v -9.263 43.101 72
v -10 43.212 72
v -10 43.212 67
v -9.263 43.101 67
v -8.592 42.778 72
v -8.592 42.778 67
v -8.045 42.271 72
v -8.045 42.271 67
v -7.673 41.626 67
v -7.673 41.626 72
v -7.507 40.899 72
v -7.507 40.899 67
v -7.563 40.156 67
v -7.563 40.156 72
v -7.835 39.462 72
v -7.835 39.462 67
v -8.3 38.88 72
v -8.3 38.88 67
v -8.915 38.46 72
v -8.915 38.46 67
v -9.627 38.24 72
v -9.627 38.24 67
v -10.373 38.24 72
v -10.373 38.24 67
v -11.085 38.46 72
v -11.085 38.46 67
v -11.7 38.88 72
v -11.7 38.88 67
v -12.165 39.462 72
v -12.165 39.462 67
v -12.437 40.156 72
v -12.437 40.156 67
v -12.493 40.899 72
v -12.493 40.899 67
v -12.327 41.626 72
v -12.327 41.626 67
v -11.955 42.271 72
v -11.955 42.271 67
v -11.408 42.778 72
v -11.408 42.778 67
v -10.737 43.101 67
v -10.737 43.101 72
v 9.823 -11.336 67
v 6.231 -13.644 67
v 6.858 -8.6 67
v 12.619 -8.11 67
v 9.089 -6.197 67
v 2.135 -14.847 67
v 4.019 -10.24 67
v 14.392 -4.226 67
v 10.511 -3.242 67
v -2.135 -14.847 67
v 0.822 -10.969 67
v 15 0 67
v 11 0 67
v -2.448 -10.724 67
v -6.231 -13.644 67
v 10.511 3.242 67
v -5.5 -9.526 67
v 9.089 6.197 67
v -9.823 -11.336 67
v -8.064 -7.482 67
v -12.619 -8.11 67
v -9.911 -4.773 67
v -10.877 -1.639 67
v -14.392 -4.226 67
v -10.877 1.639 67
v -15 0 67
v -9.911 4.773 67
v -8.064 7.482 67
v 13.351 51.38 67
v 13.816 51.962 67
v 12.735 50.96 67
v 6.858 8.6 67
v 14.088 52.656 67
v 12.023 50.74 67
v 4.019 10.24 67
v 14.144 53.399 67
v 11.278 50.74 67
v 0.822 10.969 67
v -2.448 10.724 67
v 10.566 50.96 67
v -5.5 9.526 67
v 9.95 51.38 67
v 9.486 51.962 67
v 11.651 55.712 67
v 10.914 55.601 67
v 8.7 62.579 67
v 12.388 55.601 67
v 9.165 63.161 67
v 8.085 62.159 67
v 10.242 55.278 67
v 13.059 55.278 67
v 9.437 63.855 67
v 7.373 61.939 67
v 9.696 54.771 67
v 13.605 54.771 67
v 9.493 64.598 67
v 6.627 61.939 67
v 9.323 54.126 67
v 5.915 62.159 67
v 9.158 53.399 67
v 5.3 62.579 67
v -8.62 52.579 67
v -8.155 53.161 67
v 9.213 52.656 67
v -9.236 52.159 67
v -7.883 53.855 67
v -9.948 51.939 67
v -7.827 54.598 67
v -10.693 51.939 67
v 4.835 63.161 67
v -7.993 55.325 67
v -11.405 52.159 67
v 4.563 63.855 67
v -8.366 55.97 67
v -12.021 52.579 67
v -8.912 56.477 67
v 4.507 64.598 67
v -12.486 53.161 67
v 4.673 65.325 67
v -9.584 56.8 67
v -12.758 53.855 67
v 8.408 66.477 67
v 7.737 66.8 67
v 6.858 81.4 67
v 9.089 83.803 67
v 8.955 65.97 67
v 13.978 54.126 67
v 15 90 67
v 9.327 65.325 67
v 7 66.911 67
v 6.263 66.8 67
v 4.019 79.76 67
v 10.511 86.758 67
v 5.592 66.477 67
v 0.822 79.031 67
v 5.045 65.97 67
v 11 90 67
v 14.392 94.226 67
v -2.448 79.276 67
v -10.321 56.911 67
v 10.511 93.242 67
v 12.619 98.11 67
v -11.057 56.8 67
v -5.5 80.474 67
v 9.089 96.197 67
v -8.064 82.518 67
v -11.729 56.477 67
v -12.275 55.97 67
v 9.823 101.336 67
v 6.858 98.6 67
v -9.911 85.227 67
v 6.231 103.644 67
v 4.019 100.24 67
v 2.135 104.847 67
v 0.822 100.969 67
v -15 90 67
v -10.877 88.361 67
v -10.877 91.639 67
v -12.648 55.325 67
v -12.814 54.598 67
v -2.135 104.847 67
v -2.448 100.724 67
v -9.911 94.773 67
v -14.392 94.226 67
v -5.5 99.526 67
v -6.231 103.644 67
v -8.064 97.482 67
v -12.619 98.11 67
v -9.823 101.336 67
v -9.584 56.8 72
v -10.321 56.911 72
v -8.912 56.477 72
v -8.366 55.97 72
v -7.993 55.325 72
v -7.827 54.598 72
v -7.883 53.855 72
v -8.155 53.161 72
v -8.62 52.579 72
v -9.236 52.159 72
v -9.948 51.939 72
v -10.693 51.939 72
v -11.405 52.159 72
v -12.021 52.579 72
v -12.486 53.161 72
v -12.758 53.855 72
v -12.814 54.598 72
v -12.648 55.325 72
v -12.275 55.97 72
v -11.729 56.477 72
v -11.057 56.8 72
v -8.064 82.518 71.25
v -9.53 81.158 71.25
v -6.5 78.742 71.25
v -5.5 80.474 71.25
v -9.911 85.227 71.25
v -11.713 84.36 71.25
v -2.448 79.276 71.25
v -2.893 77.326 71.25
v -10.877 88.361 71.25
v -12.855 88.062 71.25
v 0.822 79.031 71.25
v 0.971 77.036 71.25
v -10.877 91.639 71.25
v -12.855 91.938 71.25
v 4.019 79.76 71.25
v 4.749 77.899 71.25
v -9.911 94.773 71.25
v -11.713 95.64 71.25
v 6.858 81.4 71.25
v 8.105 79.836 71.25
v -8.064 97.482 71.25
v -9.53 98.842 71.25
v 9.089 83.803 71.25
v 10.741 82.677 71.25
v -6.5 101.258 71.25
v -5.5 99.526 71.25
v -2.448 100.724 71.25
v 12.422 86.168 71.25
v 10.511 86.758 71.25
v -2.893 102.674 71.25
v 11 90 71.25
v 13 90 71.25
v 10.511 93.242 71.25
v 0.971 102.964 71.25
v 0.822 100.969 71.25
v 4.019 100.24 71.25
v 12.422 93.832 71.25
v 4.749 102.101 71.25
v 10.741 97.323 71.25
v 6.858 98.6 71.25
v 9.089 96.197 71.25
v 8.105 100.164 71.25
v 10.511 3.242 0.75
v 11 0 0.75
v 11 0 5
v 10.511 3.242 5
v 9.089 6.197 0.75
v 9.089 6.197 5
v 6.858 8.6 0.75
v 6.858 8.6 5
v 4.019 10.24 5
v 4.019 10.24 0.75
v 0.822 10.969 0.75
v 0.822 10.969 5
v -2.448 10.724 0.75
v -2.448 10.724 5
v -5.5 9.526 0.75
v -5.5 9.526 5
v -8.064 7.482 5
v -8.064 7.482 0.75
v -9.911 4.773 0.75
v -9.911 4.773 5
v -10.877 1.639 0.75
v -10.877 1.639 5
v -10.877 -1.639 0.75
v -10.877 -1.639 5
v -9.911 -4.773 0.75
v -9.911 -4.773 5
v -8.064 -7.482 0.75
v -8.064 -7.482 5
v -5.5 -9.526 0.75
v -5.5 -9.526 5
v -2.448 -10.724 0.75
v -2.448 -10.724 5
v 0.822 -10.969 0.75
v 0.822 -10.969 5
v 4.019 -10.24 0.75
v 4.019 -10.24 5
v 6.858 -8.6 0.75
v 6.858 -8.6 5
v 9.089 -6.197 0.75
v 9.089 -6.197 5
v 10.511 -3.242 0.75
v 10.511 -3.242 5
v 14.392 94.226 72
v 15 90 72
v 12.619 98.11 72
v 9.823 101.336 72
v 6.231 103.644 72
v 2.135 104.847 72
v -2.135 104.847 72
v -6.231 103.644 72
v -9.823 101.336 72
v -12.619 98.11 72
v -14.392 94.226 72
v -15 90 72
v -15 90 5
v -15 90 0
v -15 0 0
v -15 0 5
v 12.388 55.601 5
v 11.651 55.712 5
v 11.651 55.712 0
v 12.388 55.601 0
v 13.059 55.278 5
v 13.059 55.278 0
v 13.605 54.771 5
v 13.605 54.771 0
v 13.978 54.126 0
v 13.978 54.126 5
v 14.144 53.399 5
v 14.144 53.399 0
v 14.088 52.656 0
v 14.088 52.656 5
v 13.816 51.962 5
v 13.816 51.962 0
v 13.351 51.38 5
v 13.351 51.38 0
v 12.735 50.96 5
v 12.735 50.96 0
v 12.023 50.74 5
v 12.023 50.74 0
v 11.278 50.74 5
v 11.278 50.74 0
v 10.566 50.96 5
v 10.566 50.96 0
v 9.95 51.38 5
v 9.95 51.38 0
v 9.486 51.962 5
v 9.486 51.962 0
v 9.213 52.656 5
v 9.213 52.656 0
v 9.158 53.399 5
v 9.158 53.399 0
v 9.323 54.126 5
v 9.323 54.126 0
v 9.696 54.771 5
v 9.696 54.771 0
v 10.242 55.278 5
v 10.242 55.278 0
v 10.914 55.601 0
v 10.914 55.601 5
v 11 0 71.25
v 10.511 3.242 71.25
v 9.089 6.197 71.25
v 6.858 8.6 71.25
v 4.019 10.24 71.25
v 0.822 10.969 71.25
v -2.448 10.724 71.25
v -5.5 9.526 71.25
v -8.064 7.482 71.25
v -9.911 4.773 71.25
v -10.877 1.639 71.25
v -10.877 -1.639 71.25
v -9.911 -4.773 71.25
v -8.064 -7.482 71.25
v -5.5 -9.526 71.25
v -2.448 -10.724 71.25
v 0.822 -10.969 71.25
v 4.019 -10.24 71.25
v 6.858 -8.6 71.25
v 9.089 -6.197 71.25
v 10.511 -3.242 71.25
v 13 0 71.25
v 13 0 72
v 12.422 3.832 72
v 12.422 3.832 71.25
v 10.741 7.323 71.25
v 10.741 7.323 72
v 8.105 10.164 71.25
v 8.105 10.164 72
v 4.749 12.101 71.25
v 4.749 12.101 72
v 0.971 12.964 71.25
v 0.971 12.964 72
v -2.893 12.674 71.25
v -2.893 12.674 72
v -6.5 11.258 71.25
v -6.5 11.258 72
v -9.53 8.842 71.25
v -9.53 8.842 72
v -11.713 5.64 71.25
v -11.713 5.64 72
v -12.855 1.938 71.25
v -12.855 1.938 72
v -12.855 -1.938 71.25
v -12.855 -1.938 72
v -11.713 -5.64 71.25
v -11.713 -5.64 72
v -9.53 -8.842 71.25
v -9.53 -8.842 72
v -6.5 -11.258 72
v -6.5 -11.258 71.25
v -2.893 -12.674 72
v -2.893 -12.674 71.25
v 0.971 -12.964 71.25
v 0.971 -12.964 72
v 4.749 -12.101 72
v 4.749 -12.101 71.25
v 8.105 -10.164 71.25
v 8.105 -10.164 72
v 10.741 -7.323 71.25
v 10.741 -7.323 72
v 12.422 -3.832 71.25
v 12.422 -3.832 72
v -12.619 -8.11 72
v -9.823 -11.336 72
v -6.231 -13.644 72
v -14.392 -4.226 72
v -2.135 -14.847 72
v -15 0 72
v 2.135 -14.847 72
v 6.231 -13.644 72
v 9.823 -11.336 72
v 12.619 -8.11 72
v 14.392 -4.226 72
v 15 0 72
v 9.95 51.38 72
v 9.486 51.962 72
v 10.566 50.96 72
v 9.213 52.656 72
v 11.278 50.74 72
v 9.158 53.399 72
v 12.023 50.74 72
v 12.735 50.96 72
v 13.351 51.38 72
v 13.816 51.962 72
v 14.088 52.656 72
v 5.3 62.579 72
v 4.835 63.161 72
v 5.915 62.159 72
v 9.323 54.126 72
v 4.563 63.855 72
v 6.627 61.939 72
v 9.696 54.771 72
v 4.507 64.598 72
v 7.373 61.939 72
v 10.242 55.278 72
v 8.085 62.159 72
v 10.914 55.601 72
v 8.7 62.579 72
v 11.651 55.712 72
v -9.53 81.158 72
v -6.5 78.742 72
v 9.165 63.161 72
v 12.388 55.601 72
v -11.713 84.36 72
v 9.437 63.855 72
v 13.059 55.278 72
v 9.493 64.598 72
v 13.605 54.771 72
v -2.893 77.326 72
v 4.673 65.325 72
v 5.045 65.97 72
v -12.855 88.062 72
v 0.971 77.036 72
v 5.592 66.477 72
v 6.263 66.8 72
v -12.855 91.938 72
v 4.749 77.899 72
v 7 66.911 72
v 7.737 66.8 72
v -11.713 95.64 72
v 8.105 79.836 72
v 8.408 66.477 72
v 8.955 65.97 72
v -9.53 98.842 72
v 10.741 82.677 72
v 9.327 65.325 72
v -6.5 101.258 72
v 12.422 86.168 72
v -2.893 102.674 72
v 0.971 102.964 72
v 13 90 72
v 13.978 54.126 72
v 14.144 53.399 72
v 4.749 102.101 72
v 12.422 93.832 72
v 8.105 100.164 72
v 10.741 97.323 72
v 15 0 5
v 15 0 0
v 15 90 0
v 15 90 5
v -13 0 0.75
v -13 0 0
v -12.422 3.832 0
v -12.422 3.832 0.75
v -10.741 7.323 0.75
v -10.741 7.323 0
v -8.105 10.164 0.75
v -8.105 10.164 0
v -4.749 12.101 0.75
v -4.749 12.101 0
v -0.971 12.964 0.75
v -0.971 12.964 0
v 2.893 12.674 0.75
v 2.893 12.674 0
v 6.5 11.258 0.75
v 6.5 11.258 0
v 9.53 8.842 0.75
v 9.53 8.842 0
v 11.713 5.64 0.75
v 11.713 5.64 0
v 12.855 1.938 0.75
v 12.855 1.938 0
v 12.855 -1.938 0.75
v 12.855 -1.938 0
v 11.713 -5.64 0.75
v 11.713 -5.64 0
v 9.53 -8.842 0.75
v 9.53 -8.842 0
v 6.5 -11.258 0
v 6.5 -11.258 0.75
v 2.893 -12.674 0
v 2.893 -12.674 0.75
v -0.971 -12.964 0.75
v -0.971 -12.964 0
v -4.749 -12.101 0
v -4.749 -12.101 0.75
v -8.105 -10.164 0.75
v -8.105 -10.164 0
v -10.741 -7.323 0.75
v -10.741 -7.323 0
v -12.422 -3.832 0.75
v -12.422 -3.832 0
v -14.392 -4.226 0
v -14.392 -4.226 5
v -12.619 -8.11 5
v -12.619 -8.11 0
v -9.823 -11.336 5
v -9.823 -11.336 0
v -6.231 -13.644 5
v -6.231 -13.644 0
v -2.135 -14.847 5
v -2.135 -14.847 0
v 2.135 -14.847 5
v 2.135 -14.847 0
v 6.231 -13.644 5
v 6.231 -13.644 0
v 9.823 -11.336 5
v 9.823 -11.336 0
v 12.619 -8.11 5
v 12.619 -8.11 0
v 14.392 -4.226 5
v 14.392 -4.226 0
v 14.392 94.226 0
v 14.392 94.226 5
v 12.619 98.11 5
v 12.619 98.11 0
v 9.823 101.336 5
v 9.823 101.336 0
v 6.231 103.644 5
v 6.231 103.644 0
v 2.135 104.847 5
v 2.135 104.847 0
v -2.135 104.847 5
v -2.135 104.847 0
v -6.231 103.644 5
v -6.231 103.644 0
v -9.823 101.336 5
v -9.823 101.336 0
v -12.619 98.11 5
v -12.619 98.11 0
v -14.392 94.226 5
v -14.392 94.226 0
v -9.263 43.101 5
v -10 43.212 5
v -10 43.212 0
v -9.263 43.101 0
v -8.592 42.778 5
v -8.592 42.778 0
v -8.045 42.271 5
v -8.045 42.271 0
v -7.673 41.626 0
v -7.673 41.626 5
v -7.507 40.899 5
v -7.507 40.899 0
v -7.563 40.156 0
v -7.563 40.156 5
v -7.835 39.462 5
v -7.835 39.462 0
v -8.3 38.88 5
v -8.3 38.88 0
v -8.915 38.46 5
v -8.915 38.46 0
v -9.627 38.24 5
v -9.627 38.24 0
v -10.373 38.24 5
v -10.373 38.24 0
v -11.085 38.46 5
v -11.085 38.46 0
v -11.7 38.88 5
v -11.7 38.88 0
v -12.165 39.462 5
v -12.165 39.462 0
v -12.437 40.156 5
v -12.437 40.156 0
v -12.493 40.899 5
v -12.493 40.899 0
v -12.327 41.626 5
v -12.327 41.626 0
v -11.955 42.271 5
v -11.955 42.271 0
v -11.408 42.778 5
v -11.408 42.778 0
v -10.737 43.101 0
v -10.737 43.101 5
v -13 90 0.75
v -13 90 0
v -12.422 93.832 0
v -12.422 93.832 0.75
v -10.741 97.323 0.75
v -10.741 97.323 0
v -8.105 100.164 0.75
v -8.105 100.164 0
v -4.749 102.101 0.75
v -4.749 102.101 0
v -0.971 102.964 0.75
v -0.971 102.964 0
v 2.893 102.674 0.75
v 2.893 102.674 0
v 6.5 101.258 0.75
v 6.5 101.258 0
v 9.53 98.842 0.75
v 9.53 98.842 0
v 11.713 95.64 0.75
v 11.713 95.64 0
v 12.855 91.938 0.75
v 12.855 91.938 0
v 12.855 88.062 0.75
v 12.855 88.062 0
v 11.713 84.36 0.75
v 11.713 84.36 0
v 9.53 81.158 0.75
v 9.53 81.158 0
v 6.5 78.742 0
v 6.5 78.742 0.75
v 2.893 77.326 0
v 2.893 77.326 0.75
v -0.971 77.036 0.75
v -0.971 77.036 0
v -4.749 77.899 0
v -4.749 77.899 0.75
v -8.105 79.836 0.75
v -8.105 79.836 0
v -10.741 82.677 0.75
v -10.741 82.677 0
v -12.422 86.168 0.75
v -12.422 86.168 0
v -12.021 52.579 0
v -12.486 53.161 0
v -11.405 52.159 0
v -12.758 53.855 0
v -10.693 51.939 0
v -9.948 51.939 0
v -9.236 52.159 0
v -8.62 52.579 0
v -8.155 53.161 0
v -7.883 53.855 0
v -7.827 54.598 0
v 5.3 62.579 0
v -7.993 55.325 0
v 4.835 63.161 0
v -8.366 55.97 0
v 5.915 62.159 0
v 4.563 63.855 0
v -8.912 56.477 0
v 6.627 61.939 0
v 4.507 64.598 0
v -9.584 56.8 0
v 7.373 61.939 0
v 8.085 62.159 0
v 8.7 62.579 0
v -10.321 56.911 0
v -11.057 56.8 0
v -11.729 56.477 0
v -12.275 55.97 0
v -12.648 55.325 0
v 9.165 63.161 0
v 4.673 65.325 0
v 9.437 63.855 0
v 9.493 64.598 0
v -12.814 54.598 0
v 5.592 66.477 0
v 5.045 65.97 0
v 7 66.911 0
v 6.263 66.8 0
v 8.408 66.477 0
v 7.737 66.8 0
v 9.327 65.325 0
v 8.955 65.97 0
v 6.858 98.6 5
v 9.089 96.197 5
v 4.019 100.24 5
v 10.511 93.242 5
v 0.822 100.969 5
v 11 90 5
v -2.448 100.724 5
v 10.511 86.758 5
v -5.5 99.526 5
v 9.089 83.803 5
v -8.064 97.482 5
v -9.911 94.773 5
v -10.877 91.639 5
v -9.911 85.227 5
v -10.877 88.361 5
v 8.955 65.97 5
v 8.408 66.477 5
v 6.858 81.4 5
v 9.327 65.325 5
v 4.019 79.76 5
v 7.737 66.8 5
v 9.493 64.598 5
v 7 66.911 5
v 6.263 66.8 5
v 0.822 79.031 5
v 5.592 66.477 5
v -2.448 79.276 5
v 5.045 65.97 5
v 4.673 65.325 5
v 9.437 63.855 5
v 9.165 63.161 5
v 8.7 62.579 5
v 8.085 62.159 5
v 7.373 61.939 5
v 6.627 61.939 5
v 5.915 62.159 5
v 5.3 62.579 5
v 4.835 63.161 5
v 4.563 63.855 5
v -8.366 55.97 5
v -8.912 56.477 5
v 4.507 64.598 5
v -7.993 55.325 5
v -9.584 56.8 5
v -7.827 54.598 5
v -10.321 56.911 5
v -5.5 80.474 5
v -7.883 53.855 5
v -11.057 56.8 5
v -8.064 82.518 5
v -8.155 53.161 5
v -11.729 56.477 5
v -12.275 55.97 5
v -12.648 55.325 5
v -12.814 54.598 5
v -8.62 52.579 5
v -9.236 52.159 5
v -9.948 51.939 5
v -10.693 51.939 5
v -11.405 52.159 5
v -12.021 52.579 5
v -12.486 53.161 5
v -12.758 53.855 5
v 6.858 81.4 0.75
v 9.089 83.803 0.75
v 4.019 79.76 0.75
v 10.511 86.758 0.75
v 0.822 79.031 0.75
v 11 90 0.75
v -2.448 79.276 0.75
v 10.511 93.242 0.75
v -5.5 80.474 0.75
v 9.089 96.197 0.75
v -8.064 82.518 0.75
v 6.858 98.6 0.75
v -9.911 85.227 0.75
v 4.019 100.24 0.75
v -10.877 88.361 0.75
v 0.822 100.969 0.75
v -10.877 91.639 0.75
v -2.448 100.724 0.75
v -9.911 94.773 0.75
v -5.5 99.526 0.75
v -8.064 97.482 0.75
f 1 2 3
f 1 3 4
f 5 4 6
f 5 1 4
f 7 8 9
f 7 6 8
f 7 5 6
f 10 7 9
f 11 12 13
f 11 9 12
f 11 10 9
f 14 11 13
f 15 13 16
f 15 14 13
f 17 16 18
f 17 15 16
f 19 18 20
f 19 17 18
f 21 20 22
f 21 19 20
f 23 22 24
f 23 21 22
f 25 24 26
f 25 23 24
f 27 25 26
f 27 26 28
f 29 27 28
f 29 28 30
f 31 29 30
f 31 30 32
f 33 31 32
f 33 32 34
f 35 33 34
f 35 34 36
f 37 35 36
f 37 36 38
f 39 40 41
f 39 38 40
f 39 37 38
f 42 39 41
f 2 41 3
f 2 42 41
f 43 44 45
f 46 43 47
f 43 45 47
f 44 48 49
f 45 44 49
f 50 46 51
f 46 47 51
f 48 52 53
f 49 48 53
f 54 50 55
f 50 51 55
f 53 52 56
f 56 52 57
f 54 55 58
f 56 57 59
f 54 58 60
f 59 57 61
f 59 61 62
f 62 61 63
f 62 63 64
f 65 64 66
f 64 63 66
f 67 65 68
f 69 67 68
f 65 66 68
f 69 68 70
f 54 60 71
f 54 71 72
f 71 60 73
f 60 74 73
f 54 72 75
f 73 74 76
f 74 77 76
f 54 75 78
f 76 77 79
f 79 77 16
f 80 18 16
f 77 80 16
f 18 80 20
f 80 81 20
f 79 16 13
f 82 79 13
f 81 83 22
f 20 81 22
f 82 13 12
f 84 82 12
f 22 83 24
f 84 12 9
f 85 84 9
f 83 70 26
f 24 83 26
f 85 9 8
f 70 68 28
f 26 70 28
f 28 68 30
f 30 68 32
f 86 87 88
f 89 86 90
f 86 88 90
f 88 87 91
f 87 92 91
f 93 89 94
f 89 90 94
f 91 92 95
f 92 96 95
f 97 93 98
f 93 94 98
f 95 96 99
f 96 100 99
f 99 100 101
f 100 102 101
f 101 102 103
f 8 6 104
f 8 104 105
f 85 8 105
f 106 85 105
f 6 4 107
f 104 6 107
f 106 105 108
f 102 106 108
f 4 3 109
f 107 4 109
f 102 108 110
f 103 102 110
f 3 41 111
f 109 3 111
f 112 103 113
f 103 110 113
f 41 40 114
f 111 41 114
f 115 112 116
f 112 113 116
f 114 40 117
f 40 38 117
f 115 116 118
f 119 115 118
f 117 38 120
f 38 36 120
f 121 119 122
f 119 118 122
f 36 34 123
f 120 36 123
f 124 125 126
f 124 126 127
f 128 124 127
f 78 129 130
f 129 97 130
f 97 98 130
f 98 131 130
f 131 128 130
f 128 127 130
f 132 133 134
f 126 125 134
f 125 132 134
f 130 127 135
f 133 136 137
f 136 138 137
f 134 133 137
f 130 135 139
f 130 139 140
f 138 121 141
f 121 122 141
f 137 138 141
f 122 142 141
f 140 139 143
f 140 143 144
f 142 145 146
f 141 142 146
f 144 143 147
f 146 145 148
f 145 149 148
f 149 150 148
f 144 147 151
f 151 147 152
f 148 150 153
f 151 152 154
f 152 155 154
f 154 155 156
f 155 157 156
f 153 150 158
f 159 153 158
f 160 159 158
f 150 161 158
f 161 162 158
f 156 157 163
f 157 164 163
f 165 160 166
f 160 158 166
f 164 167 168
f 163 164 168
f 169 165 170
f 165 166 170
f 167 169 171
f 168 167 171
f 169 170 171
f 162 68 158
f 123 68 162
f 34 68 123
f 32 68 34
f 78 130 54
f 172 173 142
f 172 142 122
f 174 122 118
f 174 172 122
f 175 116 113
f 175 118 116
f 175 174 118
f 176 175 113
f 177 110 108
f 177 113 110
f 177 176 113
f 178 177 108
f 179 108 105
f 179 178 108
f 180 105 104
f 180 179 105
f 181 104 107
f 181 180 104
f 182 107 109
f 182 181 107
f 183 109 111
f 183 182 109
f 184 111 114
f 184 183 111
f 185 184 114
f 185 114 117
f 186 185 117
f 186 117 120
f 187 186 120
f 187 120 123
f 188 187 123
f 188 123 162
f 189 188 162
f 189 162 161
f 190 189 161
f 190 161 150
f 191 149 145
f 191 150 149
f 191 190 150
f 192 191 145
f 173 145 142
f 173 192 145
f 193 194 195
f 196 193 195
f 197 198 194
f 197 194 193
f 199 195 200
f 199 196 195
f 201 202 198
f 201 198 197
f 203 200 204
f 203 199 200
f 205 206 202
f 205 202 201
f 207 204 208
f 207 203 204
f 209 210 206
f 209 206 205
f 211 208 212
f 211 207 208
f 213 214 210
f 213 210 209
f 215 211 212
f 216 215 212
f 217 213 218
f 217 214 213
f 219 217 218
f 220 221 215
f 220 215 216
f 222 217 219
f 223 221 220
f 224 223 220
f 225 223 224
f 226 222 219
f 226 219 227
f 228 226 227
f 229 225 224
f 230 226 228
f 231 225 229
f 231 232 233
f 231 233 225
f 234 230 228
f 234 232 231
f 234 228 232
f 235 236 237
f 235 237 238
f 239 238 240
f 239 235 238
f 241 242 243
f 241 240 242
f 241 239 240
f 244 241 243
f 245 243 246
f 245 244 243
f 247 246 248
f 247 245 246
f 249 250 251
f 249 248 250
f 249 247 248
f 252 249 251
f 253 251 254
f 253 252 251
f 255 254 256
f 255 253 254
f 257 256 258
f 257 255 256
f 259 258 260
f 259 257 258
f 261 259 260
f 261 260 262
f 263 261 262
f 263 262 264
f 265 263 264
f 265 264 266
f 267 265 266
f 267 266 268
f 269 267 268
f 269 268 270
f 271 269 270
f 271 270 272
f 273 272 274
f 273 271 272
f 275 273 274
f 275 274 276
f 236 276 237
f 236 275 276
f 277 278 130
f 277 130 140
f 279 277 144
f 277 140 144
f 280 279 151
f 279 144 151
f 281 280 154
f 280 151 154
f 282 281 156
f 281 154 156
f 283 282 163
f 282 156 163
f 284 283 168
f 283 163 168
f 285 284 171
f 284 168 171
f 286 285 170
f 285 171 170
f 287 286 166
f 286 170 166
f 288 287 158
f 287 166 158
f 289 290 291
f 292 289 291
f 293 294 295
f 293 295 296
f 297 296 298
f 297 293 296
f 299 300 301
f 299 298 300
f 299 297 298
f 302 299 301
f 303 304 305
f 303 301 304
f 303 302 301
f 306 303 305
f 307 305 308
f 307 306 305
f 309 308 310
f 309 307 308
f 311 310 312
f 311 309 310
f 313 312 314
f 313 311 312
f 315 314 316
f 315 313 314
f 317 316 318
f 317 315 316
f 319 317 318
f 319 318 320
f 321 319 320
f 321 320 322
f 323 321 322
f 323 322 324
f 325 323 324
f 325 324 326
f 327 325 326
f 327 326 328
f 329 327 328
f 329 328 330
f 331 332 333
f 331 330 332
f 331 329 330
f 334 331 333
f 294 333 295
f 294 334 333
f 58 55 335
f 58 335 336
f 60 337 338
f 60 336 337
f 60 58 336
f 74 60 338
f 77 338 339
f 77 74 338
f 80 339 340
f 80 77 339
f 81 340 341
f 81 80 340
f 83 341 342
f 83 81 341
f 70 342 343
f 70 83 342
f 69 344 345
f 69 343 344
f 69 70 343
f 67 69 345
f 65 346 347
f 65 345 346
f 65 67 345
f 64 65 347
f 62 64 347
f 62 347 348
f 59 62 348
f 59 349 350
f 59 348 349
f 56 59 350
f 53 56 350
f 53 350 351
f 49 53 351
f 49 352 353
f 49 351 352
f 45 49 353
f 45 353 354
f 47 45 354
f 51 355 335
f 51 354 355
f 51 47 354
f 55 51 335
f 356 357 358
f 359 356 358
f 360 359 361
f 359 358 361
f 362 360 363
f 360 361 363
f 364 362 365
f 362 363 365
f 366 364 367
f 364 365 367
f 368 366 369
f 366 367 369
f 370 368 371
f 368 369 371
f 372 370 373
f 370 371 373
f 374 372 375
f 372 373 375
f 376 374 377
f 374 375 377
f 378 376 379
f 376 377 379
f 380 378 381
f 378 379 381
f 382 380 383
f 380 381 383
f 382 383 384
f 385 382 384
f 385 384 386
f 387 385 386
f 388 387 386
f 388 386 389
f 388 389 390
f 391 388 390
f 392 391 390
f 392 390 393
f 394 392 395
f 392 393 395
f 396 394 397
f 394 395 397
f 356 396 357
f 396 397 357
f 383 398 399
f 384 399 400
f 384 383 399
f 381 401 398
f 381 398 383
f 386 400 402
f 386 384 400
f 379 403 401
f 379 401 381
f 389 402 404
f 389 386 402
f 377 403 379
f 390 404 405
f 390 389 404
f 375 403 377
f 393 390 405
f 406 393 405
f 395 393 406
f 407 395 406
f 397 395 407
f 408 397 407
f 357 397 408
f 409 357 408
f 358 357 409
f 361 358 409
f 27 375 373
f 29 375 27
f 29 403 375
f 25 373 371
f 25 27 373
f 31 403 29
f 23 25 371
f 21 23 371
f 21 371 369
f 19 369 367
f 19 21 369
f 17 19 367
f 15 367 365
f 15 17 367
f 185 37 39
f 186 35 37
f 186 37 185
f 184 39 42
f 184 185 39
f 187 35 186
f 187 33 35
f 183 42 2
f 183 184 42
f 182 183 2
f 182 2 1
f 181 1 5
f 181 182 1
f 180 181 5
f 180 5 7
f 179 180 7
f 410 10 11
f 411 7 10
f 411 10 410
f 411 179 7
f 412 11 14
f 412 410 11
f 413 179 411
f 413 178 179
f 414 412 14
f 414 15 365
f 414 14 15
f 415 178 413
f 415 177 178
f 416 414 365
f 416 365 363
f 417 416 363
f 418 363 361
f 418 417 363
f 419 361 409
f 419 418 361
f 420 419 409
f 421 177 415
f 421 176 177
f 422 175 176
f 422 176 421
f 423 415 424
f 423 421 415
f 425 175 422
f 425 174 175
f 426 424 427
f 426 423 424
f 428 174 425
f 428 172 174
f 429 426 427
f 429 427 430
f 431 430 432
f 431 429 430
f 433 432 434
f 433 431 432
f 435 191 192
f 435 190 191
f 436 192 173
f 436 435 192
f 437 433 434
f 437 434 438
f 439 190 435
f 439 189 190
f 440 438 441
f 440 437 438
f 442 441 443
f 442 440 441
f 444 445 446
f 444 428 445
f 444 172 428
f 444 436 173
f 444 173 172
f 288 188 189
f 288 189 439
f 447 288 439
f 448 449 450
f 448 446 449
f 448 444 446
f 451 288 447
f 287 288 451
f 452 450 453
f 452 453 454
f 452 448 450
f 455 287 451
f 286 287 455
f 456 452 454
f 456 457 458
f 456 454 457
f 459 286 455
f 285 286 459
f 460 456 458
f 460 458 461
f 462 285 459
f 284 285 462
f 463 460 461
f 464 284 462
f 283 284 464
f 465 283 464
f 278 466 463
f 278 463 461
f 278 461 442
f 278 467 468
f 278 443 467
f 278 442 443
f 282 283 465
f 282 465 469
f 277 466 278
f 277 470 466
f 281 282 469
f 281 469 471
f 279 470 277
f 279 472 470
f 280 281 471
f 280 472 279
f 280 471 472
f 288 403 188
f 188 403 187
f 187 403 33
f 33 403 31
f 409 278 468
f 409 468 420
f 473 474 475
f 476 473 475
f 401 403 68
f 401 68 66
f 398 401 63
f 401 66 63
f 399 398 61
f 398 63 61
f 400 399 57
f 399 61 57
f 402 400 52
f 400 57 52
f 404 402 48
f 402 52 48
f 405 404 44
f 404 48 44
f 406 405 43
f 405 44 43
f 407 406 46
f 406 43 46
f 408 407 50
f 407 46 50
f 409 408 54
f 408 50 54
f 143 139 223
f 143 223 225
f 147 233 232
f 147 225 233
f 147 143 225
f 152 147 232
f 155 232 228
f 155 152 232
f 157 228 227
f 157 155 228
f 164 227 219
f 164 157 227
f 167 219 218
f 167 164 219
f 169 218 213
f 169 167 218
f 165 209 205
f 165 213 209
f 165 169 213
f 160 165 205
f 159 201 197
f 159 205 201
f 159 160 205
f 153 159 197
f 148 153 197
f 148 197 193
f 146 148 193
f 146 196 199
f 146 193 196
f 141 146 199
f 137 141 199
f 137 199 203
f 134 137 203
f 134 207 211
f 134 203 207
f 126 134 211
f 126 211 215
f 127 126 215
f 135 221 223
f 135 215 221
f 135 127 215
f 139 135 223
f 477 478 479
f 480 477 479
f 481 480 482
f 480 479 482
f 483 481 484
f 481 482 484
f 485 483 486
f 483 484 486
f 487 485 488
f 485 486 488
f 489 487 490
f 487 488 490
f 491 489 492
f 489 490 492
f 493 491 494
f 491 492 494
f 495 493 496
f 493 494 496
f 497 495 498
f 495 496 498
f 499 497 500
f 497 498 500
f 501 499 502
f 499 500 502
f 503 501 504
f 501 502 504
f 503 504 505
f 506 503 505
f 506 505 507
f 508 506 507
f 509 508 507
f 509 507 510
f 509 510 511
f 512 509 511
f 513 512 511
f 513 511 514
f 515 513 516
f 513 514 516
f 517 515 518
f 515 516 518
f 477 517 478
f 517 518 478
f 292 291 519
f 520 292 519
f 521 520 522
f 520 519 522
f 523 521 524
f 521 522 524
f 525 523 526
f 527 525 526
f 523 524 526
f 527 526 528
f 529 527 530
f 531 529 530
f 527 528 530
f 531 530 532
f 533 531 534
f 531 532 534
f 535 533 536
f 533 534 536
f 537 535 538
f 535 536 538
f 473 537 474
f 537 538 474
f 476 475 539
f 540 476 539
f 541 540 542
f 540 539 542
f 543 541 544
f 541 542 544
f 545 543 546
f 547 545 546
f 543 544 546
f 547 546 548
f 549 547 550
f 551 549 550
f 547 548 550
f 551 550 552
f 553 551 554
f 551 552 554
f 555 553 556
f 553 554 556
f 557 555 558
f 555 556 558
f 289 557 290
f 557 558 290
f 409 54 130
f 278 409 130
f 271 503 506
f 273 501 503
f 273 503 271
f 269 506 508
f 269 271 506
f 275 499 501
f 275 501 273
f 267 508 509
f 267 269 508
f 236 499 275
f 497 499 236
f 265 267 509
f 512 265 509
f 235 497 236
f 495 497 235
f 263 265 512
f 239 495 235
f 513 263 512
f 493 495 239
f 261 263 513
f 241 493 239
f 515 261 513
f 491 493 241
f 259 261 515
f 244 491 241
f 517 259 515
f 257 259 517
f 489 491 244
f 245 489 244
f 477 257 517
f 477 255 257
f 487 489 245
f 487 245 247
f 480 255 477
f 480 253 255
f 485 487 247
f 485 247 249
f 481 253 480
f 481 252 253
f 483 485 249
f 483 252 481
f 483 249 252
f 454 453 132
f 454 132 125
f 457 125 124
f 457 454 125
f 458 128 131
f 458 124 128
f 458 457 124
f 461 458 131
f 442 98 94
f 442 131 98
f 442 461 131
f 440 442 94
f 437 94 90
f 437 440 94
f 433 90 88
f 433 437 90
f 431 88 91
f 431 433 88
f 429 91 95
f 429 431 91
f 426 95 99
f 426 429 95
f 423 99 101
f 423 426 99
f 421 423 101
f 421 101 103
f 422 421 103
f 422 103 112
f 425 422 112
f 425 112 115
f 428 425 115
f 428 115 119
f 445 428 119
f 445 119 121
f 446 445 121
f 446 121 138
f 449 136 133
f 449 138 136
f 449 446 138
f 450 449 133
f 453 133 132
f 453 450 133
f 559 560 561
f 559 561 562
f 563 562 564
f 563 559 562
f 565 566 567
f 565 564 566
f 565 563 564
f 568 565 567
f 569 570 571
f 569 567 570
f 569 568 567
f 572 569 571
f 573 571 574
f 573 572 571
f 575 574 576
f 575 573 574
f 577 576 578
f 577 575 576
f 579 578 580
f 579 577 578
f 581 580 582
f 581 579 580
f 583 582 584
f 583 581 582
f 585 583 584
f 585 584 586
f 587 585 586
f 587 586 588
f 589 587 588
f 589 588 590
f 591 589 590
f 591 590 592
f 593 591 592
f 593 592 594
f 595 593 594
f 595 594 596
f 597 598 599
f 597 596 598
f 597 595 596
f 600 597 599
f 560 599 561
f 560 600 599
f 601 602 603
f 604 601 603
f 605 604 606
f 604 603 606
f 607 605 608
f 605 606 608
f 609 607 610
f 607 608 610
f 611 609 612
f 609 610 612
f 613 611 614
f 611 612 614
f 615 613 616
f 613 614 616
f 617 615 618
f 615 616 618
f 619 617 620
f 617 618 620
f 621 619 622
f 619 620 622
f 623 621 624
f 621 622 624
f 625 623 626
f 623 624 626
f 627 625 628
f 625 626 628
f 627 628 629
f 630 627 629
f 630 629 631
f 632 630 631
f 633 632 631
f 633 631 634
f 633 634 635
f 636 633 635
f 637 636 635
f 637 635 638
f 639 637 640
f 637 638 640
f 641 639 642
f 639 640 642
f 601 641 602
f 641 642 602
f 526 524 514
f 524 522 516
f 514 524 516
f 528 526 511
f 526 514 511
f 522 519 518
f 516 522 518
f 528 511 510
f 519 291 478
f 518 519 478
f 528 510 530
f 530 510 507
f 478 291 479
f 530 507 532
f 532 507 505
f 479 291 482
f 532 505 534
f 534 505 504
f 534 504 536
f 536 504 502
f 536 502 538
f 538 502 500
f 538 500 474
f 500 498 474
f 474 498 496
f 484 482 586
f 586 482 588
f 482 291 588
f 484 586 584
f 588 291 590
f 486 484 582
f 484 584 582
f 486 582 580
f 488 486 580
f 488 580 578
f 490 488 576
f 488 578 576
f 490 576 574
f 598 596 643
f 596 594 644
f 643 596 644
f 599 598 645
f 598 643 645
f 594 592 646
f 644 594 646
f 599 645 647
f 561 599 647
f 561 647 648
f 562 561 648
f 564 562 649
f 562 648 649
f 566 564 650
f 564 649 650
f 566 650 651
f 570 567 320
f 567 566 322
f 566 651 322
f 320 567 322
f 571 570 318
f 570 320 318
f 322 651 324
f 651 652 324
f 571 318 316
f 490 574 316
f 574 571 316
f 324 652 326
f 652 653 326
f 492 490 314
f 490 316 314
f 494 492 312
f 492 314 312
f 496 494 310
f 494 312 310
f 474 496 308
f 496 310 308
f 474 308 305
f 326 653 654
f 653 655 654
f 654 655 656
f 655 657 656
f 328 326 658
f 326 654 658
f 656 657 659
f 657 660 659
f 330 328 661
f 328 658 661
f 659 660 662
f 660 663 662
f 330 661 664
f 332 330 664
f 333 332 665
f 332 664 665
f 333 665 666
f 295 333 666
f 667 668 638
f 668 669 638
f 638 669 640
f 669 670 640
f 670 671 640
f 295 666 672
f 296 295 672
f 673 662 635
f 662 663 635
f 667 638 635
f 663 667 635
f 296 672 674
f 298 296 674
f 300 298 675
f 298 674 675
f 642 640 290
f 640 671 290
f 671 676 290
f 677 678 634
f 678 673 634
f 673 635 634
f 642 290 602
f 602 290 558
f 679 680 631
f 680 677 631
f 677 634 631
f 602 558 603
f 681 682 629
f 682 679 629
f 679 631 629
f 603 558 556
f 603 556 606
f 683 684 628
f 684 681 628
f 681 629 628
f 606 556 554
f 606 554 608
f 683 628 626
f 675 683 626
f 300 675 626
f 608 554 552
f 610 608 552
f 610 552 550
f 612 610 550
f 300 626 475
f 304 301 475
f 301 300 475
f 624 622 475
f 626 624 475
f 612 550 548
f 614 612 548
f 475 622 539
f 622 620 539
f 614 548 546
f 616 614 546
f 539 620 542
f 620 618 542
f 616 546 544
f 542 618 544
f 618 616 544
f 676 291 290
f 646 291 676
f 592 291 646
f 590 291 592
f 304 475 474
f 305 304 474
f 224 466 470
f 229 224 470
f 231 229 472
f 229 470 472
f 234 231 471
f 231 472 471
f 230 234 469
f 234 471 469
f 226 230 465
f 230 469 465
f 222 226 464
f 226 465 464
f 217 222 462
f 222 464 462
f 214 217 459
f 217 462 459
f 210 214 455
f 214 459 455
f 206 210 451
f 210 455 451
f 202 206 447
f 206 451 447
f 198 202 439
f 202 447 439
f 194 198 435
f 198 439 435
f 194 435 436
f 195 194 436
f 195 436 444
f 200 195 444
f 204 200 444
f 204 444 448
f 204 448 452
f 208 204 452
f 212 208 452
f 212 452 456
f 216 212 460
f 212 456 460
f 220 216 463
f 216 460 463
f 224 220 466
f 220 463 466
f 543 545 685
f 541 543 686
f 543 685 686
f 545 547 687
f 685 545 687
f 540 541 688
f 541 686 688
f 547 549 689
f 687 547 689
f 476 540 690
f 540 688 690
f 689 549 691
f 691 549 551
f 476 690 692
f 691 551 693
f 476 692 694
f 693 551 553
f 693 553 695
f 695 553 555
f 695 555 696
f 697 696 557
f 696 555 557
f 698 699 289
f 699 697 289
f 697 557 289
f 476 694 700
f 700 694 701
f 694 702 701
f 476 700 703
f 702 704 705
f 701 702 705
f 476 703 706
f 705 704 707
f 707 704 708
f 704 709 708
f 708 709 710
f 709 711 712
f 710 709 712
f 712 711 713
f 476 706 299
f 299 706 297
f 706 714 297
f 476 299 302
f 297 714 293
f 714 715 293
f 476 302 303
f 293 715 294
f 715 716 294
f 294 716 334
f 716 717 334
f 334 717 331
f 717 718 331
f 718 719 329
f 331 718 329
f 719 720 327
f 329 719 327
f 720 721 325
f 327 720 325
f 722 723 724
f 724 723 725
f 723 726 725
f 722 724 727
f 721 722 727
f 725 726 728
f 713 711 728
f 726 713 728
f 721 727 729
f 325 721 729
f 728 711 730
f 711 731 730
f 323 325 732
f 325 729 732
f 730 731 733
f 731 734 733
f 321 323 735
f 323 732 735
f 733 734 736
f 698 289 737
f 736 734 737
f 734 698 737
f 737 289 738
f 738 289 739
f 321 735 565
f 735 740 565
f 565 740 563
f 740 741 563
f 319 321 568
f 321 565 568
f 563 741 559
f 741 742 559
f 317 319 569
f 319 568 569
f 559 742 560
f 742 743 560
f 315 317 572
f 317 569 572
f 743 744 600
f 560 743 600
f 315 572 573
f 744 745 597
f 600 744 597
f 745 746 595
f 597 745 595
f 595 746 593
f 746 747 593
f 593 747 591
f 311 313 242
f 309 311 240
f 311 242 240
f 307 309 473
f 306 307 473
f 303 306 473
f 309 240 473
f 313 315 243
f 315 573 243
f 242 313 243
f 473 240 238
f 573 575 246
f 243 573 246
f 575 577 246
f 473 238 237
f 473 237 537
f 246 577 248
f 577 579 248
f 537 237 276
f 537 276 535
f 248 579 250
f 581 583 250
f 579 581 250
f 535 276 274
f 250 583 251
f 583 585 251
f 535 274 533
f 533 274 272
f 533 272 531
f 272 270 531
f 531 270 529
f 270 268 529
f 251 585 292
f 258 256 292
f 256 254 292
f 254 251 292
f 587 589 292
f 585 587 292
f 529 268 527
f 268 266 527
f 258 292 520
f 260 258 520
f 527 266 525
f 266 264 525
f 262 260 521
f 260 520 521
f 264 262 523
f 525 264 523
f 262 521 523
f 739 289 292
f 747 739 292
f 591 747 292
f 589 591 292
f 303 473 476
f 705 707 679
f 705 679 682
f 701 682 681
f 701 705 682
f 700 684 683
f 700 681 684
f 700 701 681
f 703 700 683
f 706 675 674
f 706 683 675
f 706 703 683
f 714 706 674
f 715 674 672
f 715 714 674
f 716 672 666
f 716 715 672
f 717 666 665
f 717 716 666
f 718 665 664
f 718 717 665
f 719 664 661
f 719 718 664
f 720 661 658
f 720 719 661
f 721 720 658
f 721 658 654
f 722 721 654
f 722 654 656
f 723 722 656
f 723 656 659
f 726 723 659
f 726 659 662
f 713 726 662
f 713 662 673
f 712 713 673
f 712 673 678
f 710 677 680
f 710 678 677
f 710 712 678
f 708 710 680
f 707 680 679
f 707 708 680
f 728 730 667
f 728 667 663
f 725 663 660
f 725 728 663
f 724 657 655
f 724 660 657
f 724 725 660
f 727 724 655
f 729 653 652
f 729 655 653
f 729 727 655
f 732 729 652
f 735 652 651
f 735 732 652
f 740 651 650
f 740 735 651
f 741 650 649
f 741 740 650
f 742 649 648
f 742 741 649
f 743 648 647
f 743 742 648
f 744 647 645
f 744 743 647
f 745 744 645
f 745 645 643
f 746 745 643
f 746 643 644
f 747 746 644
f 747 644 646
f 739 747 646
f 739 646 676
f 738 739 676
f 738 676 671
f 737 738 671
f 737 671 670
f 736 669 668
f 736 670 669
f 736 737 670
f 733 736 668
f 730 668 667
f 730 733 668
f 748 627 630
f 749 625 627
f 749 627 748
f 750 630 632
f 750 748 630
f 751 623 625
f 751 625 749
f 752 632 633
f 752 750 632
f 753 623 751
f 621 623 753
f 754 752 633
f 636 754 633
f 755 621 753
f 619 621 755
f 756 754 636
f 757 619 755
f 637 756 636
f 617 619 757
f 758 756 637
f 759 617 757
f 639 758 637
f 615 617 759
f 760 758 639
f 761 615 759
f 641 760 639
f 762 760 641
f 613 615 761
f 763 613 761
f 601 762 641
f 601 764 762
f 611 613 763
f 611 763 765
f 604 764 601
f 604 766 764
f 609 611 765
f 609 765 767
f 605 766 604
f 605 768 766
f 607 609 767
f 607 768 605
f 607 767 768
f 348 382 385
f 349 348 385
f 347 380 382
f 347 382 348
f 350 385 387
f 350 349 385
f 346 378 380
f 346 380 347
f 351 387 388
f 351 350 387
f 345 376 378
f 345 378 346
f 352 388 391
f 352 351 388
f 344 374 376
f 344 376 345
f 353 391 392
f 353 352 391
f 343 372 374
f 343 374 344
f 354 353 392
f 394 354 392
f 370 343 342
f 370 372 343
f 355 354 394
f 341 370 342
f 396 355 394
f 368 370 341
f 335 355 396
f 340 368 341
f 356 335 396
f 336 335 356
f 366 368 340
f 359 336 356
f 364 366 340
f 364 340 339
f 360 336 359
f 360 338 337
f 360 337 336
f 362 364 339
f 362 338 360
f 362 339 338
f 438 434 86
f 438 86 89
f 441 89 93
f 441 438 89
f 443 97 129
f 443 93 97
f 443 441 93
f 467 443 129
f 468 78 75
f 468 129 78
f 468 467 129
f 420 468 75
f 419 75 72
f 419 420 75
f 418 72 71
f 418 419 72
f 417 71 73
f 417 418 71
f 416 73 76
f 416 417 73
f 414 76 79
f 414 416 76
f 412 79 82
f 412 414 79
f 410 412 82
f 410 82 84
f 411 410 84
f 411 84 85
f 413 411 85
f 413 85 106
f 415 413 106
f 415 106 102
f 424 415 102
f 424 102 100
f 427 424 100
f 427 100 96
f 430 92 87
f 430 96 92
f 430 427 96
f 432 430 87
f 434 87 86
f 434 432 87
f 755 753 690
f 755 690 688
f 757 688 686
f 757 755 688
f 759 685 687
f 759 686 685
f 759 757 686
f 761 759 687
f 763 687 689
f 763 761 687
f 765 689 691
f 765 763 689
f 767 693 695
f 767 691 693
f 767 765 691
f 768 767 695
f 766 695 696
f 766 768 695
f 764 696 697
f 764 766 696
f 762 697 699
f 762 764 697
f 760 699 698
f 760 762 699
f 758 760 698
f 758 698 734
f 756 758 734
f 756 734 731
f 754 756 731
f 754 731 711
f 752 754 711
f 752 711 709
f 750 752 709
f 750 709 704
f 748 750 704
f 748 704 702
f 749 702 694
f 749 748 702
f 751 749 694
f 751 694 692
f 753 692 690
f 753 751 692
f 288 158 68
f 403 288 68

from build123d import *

# Parameters (mm, degrees)
SKETCH_1_R               = 11
EXTRUDE_1_DEPTH          = 72
SKETCH_2_W               = 62
SKETCH_2_H               = 70
SKETCH_2_H_2             = 67.94057246
CUT_EXTRUDE_1_DEPTH      = 70
EXTRUDE_2_DEPTH          = 62
EXTRUDE_3_DEPTH          = 62
CUT_EXTRUDE_3_DEPTH      = 130.811063026
CUT_EXTRUDE_3_DEPTH_BACK = 130.811063026
SKETCH_6_R               = 2.5
CUT_EXTRUDE_4_DEPTH      = 136.359998088
CUT_EXTRUDE_4_DEPTH_BACK = 136.359998088
SKETCH_7_W               = 62
SKETCH_7_H               = 120
SKETCH_8_R               = 13
CUT_EXTRUDE_5_DEPTH      = 0.75
SKETCH_9_R               = 13
CUT_EXTRUDE_6_DEPTH      = 0.75
SKETCH_12_R              = 13
CUT_EXTRUDE_7_DEPTH      = 0.75
SKETCH_13_R              = 13
CUT_EXTRUDE_8_DEPTH      = 0.75


with BuildPart() as part:
    # 草图1 → 凸台-拉伸1 (new body)
    with BuildSketch(Plane.XY):
        with BuildLine():
            Line((-15, 90), (-15, 0))
            ThreePointArc((-15, 0), (0, -15), (15, 0))
            Line((15, 0), (15, 90))
            ThreePointArc((15, 90), (0, 105), (-15, 90))
        make_face()
        Circle(SKETCH_1_R, mode=Mode.SUBTRACT)
        with Locations((0, 90)):
            Circle(SKETCH_1_R, mode=Mode.SUBTRACT)
    extrude(amount=EXTRUDE_1_DEPTH)

    # 草图2 → 切除-拉伸1 (cut)
    with BuildSketch(Plane.ZY.offset(15)):
        with Locations((36, 80)):
            Rectangle(SKETCH_2_W, SKETCH_2_H)
        with Locations((36, 11.02971377)):
            Rectangle(SKETCH_2_W, SKETCH_2_H_2)
    extrude(amount=-CUT_EXTRUDE_1_DEPTH, mode=Mode.SUBTRACT)


with BuildPart() as cut_extrude_1_piece_1:
    # of the separate pieces the step leaves, piece 1, a body of its own (cut_extrude_1_pieces)
    add(part.part.solids().sort_by_distance((15, 0, 0))[0])



with BuildPart() as cut_extrude_1_piece_2:
    # of the separate pieces the step leaves, piece 2, a body of its own (cut_extrude_1_pieces)
    add(part.part.solids().sort_by_distance((15, 0, 67))[0])


with BuildPart() as cut_extrude_1_piece_1_1:
    add(cut_extrude_1_piece_1.part)

    add(cut_extrude_1_piece_2.part)  # 凸台-拉伸2 merges 切除-拉伸1 piece 2
    # 草图4 → 凸台-拉伸2 (add)
    with BuildSketch(Plane(origin=(0, 0, 67), x_dir=(-1, 0, 0), z_dir=(0, 0, -1))):
        with BuildLine():
            Line((-4.490156776, 68.758657712), (15, 57.50601045))
            Line((15, 57.50601045), (36.319312502, 12.911360415))
            ThreePointArc((36.319312502, 12.911360415), (35.142094618, 9.577570071), (31.808304274, 10.754787955))
            Line((31.808304274, 10.754787955), (15, 45.913541163))
            Line((15, 45.913541163), (-9.509843224, 60.064305746))
            ThreePointArc((-9.509843224, 60.064305746), (-11.347175983, 66.921324953), (-4.490156776, 68.758657712))
        make_face()
    extrude(amount=EXTRUDE_2_DEPTH)

    # 草图5 → 凸台-拉伸3 (add)
    with BuildSketch(Plane(origin=(0, 0, 67), x_dir=(-1, 0, 0), z_dir=(0, 0, -1))):
        with BuildLine():
            Line((-30.017605928, 49.094069219), (-15, 60.919508718))
            Line((-15, 60.919508718), (12.5, 45.042376315))
            ThreePointArc((12.5, 45.042376315), (14.330127019, 38.212249296), (7.5, 36.382122277))
            Line((7.5, 36.382122277), (-15, 49.372503334))
            Line((-15, 49.372503334), (-27.615908762, 44.780688066))
            ThreePointArc((-27.615908762, 44.780688066), (-30.655195979, 45.913733224), (-30.017605928, 49.094069219))
        make_face()
    extrude(amount=EXTRUDE_3_DEPTH)

    # 草图6 → 切除-拉伸3 (cut, two sides: drawn at the far end of the back side and taken through both)
    with BuildSketch(Plane(origin=(0, 0, 67), x_dir=(-1, 0, 0), z_dir=(0, 0, -1)).offset(-CUT_EXTRUDE_3_DEPTH_BACK)):
        with Locations(Location((-7, 64.411481729, 0), (0, 0, 90))):
            Circle(SKETCH_6_R)
        with Locations(Location((-11.650635095, 53.212249296, 0), (0, 0, 90))):
            Circle(SKETCH_6_R)
        with Locations(Location((10, 40.712249296, 0), (0, 0, 90))):
            Circle(SKETCH_6_R)
        with Locations(Location((10.320508076, 54.411481729, 0), (0, 0, 90))):
            Circle(SKETCH_6_R)
    extrude(amount=CUT_EXTRUDE_3_DEPTH + CUT_EXTRUDE_3_DEPTH_BACK, mode=Mode.SUBTRACT)

    # 草图7 → 切除-拉伸4 (cut, two sides: drawn at the far end of the back side and taken through both)
    with BuildSketch(Plane.ZY.offset(15).offset(-CUT_EXTRUDE_4_DEPTH_BACK)):
        with Locations((36, 45)):
            Rectangle(SKETCH_7_W, SKETCH_7_H)
    extrude(amount=CUT_EXTRUDE_4_DEPTH + CUT_EXTRUDE_4_DEPTH_BACK, mode=Mode.SUBTRACT)


with BuildPart() as cut_extrude_4_piece_1:
    # of the separate pieces the step leaves, piece 1, a body of its own (cut_extrude_4_pieces)
    add(cut_extrude_1_piece_1_1.part.solids().sort_by_distance((-15, 90, 5))[0])

    # 草图9 → 切除-拉伸6 (cut)
    with BuildSketch(Plane(origin=(0, 0, 0), x_dir=(-1, 0, 0), z_dir=(0, 0, -1))):
        Circle(SKETCH_9_R)
    extrude(amount=-CUT_EXTRUDE_6_DEPTH, mode=Mode.SUBTRACT)

    # 草图13 → 切除-拉伸8 (cut)
    with BuildSketch(Plane(origin=(0, 0, 0), x_dir=(-1, 0, 0), z_dir=(0, 0, -1))):
        with Locations((0, 90)):
            Circle(SKETCH_13_R)
    extrude(amount=-CUT_EXTRUDE_8_DEPTH, mode=Mode.SUBTRACT)


with BuildPart() as cut_extrude_4_piece_2:
    # of the separate pieces the step leaves, piece 2, a body of its own (cut_extrude_4_pieces)
    add(cut_extrude_1_piece_1_1.part.solids().sort_by_distance((15, 0, 67))[0])

    # 草图8 → 切除-拉伸5 (cut)
    with BuildSketch(Plane.XY.offset(72)):
        Circle(SKETCH_8_R)
    extrude(amount=-CUT_EXTRUDE_5_DEPTH, mode=Mode.SUBTRACT)

    # 草图12 → 切除-拉伸7 (cut)
    with BuildSketch(Plane.XY.offset(72)):
        with Locations((0, 90)):
            Circle(SKETCH_12_R)
    extrude(amount=-CUT_EXTRUDE_7_DEPTH, mode=Mode.SUBTRACT)


solid = Compound([cut_extrude_4_piece_1.part, cut_extrude_4_piece_2.part])
